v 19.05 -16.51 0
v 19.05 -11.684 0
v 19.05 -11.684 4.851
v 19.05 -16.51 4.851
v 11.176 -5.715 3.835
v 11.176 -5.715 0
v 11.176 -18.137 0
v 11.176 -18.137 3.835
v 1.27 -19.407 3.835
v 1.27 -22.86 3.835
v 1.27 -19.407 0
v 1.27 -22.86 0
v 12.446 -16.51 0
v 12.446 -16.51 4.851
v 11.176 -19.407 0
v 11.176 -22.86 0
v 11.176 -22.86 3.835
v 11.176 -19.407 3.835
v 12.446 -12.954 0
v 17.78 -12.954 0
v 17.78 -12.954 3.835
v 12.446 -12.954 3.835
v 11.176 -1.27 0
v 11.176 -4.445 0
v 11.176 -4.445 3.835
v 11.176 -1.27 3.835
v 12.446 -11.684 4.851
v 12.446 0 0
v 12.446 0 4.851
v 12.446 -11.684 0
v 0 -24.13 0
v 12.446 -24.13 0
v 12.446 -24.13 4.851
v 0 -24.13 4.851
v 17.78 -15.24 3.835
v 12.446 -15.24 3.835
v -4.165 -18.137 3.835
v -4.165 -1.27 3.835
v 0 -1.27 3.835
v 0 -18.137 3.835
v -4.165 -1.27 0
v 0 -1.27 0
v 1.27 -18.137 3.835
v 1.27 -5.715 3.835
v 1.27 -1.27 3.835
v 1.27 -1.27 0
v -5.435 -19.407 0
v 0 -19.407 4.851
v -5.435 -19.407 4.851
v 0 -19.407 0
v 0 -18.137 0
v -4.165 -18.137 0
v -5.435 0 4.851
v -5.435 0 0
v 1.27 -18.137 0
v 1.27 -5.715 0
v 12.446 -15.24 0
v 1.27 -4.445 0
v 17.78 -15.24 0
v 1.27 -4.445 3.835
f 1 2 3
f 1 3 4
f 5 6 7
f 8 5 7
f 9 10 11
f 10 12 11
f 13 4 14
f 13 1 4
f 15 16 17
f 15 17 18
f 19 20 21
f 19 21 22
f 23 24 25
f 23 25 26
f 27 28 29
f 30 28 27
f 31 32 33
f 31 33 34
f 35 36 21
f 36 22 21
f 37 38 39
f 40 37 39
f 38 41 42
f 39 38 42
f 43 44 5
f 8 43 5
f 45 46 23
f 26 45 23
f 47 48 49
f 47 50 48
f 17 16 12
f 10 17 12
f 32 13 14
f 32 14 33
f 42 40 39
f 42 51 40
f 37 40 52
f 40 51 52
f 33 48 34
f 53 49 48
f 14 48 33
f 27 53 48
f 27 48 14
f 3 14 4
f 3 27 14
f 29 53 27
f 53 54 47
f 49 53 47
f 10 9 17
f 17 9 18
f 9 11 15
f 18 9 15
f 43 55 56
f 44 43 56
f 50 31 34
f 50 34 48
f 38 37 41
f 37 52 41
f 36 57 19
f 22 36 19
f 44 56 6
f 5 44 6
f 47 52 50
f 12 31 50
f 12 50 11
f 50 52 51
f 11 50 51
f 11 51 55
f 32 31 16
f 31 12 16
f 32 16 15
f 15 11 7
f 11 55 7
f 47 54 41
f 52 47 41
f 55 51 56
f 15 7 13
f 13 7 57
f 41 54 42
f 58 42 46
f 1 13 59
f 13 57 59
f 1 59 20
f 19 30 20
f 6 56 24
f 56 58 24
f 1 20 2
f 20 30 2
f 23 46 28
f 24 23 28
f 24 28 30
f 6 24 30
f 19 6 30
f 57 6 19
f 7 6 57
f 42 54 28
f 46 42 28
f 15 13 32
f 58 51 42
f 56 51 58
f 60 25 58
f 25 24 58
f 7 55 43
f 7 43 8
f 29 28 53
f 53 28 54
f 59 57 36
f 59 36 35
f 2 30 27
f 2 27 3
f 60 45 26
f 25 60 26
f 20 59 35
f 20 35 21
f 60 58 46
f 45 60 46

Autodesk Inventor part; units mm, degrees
ref_plane "YZ Plane" through (0, 0, 0) normal (1, 0, 0) x (0, 1, 0)
ref_plane "XZ Plane" through (0, 0, 0) normal (0, 1, 0) x (-1, 0, 0)
sketch "Sketch1" plane through (0, 0, 0) normal (0, 0, 1) x (1, 0, 0)
  line L0 (11.176, -4.445) -> (1.27, -4.445)
  line L1 (-5.4348, 0) -> (-5.4348, -19.4068)
  line L2 (12.446, 0) -> (12.446, -11.684)
  line L3 (19.05, -11.684) -> (19.05, -16.51)
  line L4 (19.05, -16.51) -> (12.446, -16.51)
  line L5 (-4.1648, -1.27) -> (0, -1.27)
  line L6 (-4.1648, -18.1368) -> (-4.1648, -1.27)
  line L7 (0, -4.445) -> (0, -1.27)
  line L8 (1.27, -5.715) -> (11.176, -5.715)
  line L9 (11.176, -22.86) -> (1.27, -22.86)
  line L10 (1.27, -18.1368) -> (11.176, -18.1368)
  line L11 (12.446, -15.24) -> (17.78, -15.24)
  line L12 (17.78, -15.24) -> (17.78, -12.954)
  line L13 (17.78, -12.954) -> (12.446, -12.954)
  line L14 (11.176, -5.715) -> (11.176, -18.1368)
  line L15 (12.446, -15.24) -> (12.446, -12.954)
  line L16 (12.446, -15.24) -> (13.462, -15.24) construction
  line L17 (11.176, -4.445) -> (11.176, -1.27)
  line L18 (1.27, -4.445) -> (1.27, -1.27)
  line L19 (0, -18.1368) -> (0, -1.27)
  line L20 (1.27, -1.27) -> (11.176, -1.27)
  line L21 (1.27, -18.1368) -> (1.27, -5.715)
  line L22 (11.176, -22.86) -> (11.176, -19.4068)
  line L23 (1.27, -22.86) -> (1.27, -19.4068)
  line L24 (1.27, -22.86) -> (3.1836, -22.86) construction
  line L25 (12.446, 0) -> (-5.4348, 0)
  line L26 (12.446, -16.51) -> (12.446, -24.13)
  line L27 (0, -18.1368) -> (-4.1648, -18.1368)
  line L28 (12.446, -11.684) -> (19.05, -11.684)
  line L29 (12.446, -24.13) -> (0, -24.13)
  line L30 (0, -24.13) -> (0, -19.4068)
  line L31 (0, -19.4068) -> (-5.4348, -19.4068)
  line L32 (1.27, -19.4068) -> (11.176, -19.4068)
  point P0 (0, 0)
  point P1 (0, -10.414)
  point P2 (-4.1648, -10.414)
extrude "Extrusion1" add sketch "Sketch1" along normal blind 3.8354
sketch "Sketch3" plane through (0, 0, 3.8354) normal (0, 0, 1) x (1, 0, 0)
  line L0 (19.05, -16.51) -> (19.05, -11.684)
  line L1 (19.05, -11.684) -> (12.446, -11.684)
  line L2 (12.446, -11.684) -> (12.446, 0)
  line L3 (12.446, 0) -> (-5.4348, 0)
  line L4 (-5.4348, 0) -> (-5.4348, -19.4068)
  line L5 (-5.4348, -19.4068) -> (0, -19.4068)
  line L6 (0, -19.4068) -> (0, -24.13)
  line L7 (0, -24.13) -> (12.446, -24.13)
  line L8 (12.446, -24.13) -> (12.446, -16.51)
  line L9 (12.446, -16.51) -> (19.05, -16.51)
extrude "Extrusion3" add sketch "Sketch3" along normal blind 1.016
ref_plane "Work Plane1" through (6.223, -18.1368, 0) normal (-1, 0, 0) x (0, 0, 1)
properties part number "Remote Batery Spacer"
